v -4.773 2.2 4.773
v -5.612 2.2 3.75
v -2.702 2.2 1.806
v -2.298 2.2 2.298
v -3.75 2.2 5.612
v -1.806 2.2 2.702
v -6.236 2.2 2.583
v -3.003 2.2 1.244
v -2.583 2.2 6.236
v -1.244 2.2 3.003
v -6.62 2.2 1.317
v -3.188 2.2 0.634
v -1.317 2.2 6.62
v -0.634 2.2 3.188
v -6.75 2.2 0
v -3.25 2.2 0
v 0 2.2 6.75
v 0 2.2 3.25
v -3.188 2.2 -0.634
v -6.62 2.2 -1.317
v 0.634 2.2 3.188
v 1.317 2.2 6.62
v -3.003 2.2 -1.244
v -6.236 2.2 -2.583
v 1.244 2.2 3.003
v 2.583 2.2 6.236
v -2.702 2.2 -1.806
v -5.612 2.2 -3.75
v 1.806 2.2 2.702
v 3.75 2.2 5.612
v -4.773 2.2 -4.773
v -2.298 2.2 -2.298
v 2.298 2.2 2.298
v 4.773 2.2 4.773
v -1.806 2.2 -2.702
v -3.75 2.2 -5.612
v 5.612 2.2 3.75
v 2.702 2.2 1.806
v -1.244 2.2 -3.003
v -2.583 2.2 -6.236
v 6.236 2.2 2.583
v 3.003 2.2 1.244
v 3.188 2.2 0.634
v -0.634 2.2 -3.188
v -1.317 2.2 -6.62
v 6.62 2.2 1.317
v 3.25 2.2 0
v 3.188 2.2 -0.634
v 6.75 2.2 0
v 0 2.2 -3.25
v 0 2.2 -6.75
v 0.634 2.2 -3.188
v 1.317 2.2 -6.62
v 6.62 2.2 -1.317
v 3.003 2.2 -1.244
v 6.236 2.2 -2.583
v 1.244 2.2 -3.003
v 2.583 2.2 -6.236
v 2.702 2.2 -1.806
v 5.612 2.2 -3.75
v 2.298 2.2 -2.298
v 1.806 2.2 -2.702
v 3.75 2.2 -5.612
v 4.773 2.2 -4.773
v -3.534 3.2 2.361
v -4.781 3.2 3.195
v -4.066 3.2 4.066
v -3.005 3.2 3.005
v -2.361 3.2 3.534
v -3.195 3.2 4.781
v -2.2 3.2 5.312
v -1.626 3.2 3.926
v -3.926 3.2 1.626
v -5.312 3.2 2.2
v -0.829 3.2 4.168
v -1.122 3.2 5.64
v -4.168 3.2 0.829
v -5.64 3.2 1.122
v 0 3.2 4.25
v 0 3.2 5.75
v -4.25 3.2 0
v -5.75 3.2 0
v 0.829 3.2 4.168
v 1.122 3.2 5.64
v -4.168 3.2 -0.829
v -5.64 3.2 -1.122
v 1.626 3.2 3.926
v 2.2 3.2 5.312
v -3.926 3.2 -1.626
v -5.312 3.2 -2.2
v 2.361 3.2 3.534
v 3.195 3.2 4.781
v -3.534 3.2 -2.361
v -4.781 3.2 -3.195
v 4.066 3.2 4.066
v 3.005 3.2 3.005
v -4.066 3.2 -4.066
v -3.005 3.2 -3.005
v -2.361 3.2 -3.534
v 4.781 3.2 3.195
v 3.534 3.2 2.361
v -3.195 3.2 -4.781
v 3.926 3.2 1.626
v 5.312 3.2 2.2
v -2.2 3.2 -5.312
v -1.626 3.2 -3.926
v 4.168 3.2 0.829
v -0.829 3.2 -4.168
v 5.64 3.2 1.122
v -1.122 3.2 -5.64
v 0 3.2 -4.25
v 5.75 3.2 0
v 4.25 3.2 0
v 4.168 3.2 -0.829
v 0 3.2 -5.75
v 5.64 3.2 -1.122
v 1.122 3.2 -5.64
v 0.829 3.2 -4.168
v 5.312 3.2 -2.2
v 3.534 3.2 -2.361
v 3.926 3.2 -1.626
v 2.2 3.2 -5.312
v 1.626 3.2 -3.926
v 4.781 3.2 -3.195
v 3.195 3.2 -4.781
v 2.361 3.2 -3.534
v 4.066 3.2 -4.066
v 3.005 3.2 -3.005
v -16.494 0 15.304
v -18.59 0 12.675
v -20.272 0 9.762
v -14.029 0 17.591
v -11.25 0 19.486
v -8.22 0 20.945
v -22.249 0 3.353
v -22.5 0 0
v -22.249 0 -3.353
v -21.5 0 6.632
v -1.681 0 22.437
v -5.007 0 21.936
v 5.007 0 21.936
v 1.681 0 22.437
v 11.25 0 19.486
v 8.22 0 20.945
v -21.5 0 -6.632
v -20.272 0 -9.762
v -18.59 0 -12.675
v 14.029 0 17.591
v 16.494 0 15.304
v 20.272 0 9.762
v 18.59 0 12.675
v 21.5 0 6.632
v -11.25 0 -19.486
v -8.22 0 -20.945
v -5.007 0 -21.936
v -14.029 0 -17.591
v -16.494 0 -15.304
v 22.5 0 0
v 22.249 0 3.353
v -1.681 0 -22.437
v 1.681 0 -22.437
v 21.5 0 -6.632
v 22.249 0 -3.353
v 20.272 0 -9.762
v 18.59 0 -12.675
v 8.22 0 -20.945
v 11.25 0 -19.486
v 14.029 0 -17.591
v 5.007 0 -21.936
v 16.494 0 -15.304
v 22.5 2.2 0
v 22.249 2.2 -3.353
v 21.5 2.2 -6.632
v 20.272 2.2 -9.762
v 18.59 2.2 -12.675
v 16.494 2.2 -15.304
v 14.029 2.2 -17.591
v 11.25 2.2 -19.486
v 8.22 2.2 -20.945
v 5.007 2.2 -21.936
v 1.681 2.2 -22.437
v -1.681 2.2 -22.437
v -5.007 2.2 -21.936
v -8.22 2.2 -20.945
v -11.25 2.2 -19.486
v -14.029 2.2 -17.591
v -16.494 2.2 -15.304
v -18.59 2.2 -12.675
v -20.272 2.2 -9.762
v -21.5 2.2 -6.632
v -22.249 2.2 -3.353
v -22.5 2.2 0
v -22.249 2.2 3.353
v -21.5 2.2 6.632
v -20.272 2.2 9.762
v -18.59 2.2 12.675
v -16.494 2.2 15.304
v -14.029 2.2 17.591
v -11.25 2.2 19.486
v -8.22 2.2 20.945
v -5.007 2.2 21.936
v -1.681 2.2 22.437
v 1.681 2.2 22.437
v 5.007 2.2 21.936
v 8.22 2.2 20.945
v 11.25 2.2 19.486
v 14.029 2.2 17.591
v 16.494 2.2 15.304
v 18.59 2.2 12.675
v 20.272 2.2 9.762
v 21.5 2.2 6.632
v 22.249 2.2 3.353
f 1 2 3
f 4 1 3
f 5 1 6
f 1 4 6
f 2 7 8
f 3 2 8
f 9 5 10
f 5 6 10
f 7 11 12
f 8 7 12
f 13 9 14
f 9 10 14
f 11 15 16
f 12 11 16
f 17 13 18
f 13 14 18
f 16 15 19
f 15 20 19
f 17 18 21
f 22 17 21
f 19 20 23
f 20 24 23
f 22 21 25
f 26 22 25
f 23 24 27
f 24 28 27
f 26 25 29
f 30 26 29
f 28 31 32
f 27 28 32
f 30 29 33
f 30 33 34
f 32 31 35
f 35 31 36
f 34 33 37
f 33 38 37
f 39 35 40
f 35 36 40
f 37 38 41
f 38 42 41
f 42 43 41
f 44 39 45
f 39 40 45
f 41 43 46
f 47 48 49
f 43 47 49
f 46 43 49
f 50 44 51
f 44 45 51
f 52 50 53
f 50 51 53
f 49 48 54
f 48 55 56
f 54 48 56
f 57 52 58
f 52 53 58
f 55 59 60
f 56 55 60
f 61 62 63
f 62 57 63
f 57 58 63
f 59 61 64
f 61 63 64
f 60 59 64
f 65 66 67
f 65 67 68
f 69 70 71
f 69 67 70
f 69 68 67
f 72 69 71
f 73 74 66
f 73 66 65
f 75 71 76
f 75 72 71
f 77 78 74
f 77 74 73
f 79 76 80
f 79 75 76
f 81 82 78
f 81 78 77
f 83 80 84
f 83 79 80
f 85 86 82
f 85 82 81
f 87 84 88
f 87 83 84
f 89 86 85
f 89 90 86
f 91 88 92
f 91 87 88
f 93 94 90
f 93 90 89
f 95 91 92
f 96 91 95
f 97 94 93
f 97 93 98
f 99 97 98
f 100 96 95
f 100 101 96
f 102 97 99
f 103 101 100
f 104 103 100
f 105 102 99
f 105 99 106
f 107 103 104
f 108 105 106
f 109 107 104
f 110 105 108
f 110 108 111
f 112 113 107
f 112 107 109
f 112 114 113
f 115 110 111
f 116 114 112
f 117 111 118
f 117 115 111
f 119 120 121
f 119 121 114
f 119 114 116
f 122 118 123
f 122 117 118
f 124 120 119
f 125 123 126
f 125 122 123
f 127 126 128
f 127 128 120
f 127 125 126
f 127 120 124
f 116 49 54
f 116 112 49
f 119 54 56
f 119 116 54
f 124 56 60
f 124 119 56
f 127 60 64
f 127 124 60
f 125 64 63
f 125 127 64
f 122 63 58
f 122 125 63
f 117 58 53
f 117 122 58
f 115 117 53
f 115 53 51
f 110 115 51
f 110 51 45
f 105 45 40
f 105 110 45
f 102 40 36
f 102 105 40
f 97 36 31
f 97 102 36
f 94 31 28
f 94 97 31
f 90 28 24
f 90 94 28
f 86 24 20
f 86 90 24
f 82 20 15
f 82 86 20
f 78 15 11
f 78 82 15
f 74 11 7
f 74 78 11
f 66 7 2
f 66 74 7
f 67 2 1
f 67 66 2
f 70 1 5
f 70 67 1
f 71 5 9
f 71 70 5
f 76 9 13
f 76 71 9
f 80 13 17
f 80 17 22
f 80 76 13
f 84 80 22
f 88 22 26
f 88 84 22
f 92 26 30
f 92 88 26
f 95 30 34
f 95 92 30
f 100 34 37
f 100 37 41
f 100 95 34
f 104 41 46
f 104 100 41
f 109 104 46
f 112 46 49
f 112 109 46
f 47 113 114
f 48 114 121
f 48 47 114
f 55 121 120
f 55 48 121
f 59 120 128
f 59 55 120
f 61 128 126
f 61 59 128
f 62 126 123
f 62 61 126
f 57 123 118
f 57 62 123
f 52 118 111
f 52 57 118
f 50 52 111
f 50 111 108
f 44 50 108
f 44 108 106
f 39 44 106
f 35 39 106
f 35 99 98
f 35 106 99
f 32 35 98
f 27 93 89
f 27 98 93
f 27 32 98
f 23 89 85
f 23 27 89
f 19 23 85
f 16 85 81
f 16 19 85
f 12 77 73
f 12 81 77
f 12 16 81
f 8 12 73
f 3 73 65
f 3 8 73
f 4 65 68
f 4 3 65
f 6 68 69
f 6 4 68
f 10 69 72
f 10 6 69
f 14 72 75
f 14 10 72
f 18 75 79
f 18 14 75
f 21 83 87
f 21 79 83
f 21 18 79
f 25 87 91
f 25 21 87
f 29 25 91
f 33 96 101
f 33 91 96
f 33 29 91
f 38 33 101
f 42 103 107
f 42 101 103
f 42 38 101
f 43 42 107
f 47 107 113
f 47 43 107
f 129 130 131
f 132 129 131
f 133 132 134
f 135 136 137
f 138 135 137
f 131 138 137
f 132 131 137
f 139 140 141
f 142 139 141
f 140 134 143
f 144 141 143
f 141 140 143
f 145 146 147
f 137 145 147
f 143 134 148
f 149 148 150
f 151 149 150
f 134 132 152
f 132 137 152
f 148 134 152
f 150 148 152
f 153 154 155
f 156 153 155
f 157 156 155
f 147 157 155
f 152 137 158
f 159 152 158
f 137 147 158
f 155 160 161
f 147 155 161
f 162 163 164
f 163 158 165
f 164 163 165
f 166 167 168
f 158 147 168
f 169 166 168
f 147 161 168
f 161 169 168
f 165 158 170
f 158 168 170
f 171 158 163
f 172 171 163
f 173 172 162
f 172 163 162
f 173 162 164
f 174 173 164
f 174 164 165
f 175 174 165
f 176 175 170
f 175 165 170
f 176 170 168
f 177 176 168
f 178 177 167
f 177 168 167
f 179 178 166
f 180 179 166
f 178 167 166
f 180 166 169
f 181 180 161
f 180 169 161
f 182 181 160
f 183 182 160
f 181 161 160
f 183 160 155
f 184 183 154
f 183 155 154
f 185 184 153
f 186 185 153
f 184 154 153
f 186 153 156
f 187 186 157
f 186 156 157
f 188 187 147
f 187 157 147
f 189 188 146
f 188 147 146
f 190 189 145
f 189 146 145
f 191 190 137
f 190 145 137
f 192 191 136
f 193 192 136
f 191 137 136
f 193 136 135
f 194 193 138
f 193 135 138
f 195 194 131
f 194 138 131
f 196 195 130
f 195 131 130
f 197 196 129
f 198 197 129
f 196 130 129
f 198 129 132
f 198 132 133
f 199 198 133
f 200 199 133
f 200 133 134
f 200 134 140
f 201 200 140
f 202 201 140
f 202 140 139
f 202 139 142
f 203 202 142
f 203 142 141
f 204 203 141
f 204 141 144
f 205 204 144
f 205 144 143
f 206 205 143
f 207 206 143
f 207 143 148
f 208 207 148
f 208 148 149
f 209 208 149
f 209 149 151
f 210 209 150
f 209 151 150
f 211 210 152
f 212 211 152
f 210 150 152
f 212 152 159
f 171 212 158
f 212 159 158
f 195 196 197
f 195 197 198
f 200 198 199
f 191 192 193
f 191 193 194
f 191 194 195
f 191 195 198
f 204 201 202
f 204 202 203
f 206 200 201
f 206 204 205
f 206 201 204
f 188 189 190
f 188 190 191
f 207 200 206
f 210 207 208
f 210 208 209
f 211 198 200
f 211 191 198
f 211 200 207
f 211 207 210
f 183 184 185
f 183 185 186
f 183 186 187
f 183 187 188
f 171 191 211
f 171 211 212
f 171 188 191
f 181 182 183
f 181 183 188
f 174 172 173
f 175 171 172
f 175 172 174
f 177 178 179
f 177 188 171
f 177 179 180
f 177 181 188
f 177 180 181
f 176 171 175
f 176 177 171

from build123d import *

# Parameters (mm, degrees)
SKETCH1_R           = 22.5
BOSS_EXTRUDE1_DEPTH = 2.2
SKETCH2_R           = 6.75
BOSS_EXTRUDE2_DEPTH = 1
BOSS_EXTRUDE2_TAPER = 45
SKETCH3_R           = 4.25
CUT_EXTRUDE1_DEPTH  = 1
CUT_EXTRUDE1_TAPER  = 45


with BuildPart() as part:
    # Sketch1 → Boss-Extrude1 (new body)
    with BuildSketch(Plane(origin=(0, 0, 0), x_dir=(1, 0, 0), z_dir=(0, 1, 0))):
        Circle(SKETCH1_R)
    extrude(amount=BOSS_EXTRUDE1_DEPTH)


with BuildPart() as body_2:
    # Sketch2 → Boss-Extrude2 (new body)
    with BuildSketch(Plane(origin=(0, 2.2, 0), x_dir=(1, 0, 0), z_dir=(0, 1, 0))):
        Circle(SKETCH2_R)
    extrude(amount=BOSS_EXTRUDE2_DEPTH, taper=BOSS_EXTRUDE2_TAPER)

    # Sketch3 → Cut-Extrude1 (cut)
    with BuildSketch(Plane(origin=(0, 3.2, 0), x_dir=(1, 0, 0), z_dir=(0, 1, 0))):
        Circle(SKETCH3_R)
    extrude(amount=-CUT_EXTRUDE1_DEPTH, taper=CUT_EXTRUDE1_TAPER, mode=Mode.SUBTRACT)


solid = Compound([part.part, body_2.part])
